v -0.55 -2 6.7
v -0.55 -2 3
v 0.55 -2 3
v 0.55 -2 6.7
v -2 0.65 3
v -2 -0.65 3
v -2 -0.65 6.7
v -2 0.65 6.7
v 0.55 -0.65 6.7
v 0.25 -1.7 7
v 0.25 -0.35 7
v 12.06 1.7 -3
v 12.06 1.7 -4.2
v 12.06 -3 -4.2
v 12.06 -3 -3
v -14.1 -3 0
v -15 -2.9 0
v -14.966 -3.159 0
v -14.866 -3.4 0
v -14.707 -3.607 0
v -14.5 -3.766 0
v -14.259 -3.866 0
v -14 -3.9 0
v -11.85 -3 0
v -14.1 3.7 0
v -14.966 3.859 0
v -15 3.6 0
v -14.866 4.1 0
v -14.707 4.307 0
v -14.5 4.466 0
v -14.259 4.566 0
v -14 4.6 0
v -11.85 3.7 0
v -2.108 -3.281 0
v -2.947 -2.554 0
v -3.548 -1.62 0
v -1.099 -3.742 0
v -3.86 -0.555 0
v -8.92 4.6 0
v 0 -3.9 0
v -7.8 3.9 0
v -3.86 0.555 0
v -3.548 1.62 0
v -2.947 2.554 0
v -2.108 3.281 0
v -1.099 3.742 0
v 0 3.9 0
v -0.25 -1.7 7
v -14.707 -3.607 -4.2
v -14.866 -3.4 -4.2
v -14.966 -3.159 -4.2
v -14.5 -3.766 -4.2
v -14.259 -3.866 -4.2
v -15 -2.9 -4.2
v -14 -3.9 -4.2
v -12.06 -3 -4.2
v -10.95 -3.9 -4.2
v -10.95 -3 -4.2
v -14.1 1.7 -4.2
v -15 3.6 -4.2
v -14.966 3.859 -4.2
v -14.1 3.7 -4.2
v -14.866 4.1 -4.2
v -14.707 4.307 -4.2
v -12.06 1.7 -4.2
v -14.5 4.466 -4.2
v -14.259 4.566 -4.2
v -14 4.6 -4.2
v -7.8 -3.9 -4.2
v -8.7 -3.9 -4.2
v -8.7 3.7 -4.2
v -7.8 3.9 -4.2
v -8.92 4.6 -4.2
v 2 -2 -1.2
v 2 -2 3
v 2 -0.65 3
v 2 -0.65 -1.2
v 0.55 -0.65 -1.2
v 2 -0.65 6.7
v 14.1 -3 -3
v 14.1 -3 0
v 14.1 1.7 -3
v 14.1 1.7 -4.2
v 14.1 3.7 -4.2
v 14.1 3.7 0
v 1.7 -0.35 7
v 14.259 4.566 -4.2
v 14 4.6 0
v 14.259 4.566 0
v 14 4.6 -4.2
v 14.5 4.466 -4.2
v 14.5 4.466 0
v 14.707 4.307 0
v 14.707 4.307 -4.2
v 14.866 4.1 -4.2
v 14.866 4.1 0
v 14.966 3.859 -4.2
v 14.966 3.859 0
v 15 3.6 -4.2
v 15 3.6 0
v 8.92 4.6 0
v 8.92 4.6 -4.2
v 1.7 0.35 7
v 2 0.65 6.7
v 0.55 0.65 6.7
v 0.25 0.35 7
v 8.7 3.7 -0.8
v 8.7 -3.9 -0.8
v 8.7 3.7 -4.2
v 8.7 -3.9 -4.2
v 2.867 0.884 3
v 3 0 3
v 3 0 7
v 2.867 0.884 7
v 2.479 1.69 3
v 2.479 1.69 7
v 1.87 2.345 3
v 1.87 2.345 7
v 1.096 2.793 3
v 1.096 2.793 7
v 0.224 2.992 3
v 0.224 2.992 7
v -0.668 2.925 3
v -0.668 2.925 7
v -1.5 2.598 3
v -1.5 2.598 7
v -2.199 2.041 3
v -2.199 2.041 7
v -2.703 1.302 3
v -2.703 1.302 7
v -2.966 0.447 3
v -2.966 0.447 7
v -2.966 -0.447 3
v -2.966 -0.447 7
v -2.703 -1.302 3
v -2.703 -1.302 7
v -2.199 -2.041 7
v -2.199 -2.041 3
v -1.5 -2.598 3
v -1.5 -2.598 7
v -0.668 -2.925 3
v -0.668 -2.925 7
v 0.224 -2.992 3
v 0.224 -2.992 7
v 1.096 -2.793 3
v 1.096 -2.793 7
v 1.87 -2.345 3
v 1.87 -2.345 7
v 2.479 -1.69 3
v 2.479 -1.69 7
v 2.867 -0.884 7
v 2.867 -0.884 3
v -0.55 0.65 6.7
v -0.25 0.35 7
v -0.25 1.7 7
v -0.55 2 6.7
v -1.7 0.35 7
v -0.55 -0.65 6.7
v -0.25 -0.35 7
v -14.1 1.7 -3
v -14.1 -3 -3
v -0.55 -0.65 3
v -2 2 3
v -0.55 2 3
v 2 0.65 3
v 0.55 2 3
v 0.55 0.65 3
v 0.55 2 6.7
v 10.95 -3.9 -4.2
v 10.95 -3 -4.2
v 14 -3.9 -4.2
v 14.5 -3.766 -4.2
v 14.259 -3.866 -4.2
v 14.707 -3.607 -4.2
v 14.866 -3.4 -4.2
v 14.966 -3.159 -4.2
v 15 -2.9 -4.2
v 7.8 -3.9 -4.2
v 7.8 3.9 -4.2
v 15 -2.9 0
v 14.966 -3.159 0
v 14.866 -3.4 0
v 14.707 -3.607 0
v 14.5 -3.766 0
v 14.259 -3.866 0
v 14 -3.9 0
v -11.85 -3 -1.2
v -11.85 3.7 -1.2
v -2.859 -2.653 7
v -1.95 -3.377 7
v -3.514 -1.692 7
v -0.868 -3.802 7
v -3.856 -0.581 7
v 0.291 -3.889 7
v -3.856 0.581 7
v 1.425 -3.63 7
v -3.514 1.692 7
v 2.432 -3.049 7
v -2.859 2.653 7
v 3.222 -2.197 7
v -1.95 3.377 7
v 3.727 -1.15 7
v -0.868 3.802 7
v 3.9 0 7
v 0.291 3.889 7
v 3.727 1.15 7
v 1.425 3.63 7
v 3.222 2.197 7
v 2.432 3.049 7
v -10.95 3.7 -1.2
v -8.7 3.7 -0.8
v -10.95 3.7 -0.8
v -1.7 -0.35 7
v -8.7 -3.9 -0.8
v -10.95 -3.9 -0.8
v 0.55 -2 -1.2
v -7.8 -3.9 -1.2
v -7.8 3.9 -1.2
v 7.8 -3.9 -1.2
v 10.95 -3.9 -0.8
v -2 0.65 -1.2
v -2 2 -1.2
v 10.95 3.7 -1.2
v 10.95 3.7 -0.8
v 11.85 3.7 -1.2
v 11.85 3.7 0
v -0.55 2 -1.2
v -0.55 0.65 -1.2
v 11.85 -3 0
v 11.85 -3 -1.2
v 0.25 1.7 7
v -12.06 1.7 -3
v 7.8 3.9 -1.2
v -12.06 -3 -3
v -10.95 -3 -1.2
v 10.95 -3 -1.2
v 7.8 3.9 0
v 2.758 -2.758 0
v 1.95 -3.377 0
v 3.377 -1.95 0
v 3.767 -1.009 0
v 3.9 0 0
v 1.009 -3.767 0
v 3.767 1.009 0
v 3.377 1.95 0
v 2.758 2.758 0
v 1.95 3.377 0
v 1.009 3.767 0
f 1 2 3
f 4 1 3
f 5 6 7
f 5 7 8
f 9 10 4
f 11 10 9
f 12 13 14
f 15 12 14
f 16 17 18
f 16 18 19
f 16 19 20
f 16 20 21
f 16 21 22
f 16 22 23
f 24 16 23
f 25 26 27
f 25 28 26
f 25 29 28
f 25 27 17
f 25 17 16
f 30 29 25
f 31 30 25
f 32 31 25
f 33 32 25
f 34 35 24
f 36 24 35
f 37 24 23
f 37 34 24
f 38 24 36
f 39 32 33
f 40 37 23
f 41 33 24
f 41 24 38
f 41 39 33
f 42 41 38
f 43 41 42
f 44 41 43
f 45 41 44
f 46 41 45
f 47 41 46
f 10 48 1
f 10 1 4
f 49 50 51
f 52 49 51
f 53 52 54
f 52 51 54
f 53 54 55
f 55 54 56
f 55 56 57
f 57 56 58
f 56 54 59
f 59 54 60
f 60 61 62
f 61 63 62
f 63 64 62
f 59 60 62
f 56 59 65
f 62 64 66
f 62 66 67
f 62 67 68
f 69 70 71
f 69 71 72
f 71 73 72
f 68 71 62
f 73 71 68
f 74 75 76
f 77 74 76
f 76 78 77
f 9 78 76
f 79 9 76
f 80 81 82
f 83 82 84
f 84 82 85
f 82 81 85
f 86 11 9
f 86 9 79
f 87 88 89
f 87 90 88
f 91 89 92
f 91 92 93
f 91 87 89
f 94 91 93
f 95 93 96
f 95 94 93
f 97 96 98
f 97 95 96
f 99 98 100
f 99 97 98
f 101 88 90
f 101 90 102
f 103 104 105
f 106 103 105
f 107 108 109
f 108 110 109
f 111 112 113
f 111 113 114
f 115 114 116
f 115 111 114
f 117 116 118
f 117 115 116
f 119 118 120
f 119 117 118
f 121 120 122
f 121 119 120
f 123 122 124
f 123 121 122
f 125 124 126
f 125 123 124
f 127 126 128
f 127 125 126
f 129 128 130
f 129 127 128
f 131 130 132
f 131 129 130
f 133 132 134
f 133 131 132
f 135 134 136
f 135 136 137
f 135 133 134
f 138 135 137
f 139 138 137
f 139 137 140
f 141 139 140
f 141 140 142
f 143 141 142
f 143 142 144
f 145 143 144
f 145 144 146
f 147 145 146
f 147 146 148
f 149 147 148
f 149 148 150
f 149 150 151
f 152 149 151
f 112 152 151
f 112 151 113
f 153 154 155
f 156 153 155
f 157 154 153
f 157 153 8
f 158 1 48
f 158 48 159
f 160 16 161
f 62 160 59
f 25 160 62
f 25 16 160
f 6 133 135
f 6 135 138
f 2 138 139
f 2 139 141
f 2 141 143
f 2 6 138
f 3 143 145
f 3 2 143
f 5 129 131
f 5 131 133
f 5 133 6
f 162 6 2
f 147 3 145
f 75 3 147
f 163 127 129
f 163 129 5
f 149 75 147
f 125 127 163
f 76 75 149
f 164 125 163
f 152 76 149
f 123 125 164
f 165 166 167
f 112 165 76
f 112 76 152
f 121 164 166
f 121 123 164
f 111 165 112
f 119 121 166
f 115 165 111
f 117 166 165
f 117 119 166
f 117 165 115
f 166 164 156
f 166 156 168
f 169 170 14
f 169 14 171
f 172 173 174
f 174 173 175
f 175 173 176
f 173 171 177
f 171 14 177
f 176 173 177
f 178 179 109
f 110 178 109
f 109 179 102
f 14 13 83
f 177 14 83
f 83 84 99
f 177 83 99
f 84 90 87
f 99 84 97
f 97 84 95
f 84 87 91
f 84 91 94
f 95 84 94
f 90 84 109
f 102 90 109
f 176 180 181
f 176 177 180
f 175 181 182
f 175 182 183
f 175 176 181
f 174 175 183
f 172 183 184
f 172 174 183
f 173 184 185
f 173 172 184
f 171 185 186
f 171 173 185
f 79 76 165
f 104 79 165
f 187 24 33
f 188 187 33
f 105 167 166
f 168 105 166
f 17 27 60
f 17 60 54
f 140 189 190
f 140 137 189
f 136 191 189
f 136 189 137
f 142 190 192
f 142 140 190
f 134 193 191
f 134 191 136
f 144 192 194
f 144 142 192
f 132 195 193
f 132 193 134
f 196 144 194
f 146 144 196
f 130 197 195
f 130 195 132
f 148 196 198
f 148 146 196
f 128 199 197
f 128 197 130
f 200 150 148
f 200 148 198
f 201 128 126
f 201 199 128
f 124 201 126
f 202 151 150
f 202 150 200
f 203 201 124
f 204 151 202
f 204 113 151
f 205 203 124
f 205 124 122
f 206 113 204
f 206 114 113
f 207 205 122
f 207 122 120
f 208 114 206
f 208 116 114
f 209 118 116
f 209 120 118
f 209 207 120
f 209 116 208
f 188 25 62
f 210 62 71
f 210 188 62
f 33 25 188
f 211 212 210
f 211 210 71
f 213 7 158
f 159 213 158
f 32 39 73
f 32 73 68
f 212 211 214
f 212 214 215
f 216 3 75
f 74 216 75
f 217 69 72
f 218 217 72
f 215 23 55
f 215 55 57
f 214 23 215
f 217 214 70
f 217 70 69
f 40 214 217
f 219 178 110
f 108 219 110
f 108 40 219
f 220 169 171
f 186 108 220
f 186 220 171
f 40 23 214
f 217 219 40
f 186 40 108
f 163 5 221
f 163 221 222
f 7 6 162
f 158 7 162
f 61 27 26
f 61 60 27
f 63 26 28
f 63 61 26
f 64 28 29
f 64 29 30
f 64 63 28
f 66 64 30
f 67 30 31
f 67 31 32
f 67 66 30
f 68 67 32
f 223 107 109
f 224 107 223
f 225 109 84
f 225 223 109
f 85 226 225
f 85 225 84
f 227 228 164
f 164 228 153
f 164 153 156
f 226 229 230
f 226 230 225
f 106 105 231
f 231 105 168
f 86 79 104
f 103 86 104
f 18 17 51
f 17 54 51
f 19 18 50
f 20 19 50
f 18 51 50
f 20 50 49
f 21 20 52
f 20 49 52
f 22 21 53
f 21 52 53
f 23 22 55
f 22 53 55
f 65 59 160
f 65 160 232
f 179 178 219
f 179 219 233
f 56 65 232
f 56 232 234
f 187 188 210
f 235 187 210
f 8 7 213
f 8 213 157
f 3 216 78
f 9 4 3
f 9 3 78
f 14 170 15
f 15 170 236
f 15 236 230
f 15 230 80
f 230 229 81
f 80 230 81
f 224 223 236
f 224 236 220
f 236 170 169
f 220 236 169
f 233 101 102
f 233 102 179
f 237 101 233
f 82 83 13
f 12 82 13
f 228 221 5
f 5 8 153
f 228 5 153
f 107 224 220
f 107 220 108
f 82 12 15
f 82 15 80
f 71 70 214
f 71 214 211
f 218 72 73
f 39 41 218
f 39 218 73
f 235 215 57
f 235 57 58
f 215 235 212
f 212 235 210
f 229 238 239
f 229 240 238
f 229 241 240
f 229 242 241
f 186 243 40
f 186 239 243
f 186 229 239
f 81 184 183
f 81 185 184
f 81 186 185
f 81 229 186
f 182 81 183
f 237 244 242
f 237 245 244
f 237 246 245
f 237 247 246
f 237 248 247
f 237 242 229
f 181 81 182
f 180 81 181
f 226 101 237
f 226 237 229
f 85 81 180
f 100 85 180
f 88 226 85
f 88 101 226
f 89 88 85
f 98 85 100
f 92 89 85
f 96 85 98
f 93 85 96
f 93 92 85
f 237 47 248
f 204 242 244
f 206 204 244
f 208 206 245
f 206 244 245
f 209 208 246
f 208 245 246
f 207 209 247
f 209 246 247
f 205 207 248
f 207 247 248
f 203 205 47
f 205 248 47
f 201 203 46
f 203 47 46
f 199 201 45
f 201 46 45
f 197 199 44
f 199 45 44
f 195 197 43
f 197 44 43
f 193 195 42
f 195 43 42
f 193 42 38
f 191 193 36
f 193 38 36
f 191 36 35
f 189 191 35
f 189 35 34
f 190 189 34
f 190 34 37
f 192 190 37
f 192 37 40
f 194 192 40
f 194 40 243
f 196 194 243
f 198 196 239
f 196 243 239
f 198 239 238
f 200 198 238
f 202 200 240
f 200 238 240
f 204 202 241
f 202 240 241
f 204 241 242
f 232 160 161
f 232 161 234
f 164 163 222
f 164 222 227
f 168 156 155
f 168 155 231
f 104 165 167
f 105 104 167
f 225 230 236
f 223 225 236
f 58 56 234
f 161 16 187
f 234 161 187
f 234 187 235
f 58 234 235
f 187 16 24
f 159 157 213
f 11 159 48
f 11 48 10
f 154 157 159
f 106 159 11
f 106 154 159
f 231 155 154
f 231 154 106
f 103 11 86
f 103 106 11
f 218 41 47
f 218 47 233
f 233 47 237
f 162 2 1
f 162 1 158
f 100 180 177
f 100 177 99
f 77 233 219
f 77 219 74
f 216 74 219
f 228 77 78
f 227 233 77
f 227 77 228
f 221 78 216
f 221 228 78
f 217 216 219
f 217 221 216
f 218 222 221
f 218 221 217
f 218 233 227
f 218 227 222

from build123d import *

# Parameters (mm, degrees)
SKETCH1_R               = 3.9
SKETCH1_R_2             = 3
SKETCH1_W               = 1.45
SKETCH1_H               = 1.3
SKETCH1_W_2             = 1.1
SKETCH1_H_2             = 1.35
BOSS_EXTRUDE1_DEPTH     = 7
SKETCH2_R               = 3
BOSS_EXTRUDE2_DEPTH     = 3
SKETCH4_W               = 30
SKETCH4_H               = 7.8
BOSS_EXTRUDE3_DEPTH     = 4.2
SKETCH3_W               = 1.45
SKETCH3_H               = 1.35
CUT_EXTRUDE3_DEPTH      = 18.180221186
CUT_EXTRUDE3_DEPTH_BACK = 18.180221186
SKETCH5_W               = 15.6
SKETCH5_H               = 7.8
CUT_EXTRUDE4_DEPTH      = 3
SKETCH6_W               = 2.25
SKETCH6_H               = 6.7
CUT_EXTRUDE5_DEPTH      = 3
CUT_EXTRUDE6_DEPTH      = 3
SKETCH8_W               = 2.25
SKETCH8_H               = 7.6
CUT_EXTRUDE7_DEPTH      = 0.4
FILLET1_R               = 1
CHAMFER1_SIZE           = 0.3


with BuildPart() as part:
    # Sketch1 → Boss-Extrude1 (new body)
    with BuildSketch(Plane.XY):
        Circle(SKETCH1_R)
        Circle(SKETCH1_R_2, mode=Mode.SUBTRACT)
        with Locations((-1.275, 0)):
            Rectangle(SKETCH1_W, SKETCH1_H)
        with Locations((0, -1.325)):
            Rectangle(SKETCH1_W_2, SKETCH1_H_2)
        Rectangle(SKETCH1_W_2, SKETCH1_H)
        with Locations((1.275, 0)):
            Rectangle(SKETCH1_W, SKETCH1_H)
        with Locations((0, 1.325)):
            Rectangle(SKETCH1_W_2, SKETCH1_H_2)
    extrude(amount=BOSS_EXTRUDE1_DEPTH)

    # Sketch2 → Boss-Extrude2 (add)
    with BuildSketch(Plane.XY):
        Circle(SKETCH2_R)
    extrude(amount=BOSS_EXTRUDE2_DEPTH)

    # Sketch4 → Boss-Extrude3 (add)
    with BuildSketch(Plane.XY):
        Polygon((-15, 4.6), (-15, 3.9), (-7.8, 3.9), (-8.92023417, 4.6), align=None)
        Rectangle(SKETCH4_W, SKETCH4_H)
        Polygon((8.92023417, 4.6), (7.8, 3.9), (15, 3.9), (15, 4.6), align=None)
    extrude(amount=-BOSS_EXTRUDE3_DEPTH)

    # Sketch3 → Cut-Extrude3 (cut, two sides)
    with BuildSketch(Plane.XY) as cut_extrude3_sk:
        with Locations((-1.275, 1.325)):
            Rectangle(SKETCH3_W, SKETCH3_H)
        with Locations((1.275, -1.325)):
            Rectangle(SKETCH3_W, SKETCH3_H)
    extrude(amount=CUT_EXTRUDE3_DEPTH, mode=Mode.SUBTRACT)
    extrude(cut_extrude3_sk.sketch, amount=-CUT_EXTRUDE3_DEPTH_BACK, mode=Mode.SUBTRACT)

    # Sketch5 → Cut-Extrude4 (cut)
    with BuildSketch(Plane(origin=(0, 0, -4.2), x_dir=(-1, 0, 0), z_dir=(0, 0, -1))):
        Rectangle(SKETCH5_W, SKETCH5_H)
    extrude(amount=-CUT_EXTRUDE4_DEPTH, mode=Mode.SUBTRACT)

    # Sketch6 → Cut-Extrude5 (cut)
    with BuildSketch(Plane.XY):
        with Locations((12.975, 0.35)):
            Rectangle(SKETCH6_W, SKETCH6_H)
        with Locations((-12.975, 0.35)):
            Rectangle(SKETCH6_W, SKETCH6_H)
    extrude(amount=-CUT_EXTRUDE5_DEPTH, mode=Mode.SUBTRACT)

    # Sketch7 → Cut-Extrude6 (cut)
    with BuildSketch(Plane(origin=(0, 0, -4.2), x_dir=(-1, 0, 0), z_dir=(0, 0, -1))):
        Polygon((12.06, -3), (10.95, -3), (10.95, -3.9), (8.7, -3.9), (8.7, 3.7), (14.1, 3.7), (14.1, 1.7), (12.06, 1.7), align=None)
        Polygon((-8.7, 3.7), (-14.1, 3.7), (-14.1, 1.7), (-12.06, 1.7), (-12.06, -3), (-10.95, -3), (-10.95, -3.9), (-8.7, -3.9), align=None)
    extrude(amount=-CUT_EXTRUDE6_DEPTH, mode=Mode.SUBTRACT)

    # Sketch8 → Cut-Extrude7 (cut)
    with BuildSketch(Plane(origin=(0, 0, -1.2), x_dir=(-1, 0, 0), z_dir=(0, 0, -1))):
        with Locations((-9.825, -0.1)):
            Rectangle(SKETCH8_W, SKETCH8_H)
        with Locations((9.825, -0.1)):
            Rectangle(SKETCH8_W, SKETCH8_H)
    extrude(amount=-CUT_EXTRUDE7_DEPTH, mode=Mode.SUBTRACT)

    # Fillet1
    fillet1_edges = [part.edges().sort_by_distance(p)[0] for p in [
        (-15, 4.6, -2.1),
        (15, 4.6, -2.1),
        (15, -3.9, -2.1),
        (-15, -3.9, -2.1),
    ]]
    fillet(fillet1_edges, radius=FILLET1_R)

    # Chamfer1
    chamfer1_edges = [part.edges().sort_by_distance(p)[0] for p in [
        (-2, 0, 7),
        (-1.275, -0.65, 7),
        (-0.55, -1.325, 7),
        (0, -2, 7),
        (0.55, -1.325, 7),
        (1.275, -0.65, 7),
        (-0.55, 1.325, 7),
        (2, 0, 7),
        (1.275, 0.65, 7),
        (0.55, 1.325, 7),
        (0, 2, 7),
        (-1.275, 0.65, 7),
    ]]
    chamfer(chamfer1_edges, length=CHAMFER1_SIZE)


solid = part.part
